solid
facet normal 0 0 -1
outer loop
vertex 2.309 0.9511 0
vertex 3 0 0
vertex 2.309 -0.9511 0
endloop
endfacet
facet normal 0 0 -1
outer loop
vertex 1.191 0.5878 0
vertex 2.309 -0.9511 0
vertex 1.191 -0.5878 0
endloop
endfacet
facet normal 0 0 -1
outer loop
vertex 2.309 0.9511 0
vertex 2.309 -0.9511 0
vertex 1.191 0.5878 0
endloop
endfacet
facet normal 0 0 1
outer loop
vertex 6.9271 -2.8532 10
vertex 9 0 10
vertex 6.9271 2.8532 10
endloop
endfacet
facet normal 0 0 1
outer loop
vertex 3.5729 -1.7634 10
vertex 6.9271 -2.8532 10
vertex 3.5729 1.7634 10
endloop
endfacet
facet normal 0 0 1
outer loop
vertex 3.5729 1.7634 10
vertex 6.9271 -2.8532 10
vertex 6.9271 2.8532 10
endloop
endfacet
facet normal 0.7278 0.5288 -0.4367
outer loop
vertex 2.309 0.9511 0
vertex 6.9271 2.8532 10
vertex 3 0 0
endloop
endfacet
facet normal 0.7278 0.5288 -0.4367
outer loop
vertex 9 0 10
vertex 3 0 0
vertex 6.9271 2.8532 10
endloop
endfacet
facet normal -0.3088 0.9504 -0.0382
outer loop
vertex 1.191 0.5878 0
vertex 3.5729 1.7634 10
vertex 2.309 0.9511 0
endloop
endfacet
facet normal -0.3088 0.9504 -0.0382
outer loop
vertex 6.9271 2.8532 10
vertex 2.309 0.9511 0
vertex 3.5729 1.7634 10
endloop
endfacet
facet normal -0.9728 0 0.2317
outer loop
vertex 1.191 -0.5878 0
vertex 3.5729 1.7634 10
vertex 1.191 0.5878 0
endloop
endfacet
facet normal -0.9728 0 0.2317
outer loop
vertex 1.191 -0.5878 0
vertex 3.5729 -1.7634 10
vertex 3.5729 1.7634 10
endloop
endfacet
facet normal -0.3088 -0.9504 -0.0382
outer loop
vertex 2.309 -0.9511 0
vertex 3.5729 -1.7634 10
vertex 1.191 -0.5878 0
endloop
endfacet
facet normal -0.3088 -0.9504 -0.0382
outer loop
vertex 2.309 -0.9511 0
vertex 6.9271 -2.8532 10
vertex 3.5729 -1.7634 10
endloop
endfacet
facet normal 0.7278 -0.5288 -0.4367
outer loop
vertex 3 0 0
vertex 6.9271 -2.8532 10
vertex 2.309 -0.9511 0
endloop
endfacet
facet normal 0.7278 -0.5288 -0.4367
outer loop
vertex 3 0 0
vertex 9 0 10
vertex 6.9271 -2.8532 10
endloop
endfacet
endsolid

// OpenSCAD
// Unit of length: Unit.MM
linear_extrude(height = 10.0, center = false, convexity = 10, twist = 0.0, scale = 3.0)
{
   translate(v = [2.0, 0.0])
   {
      circle(d = 2.0);
   }
}
